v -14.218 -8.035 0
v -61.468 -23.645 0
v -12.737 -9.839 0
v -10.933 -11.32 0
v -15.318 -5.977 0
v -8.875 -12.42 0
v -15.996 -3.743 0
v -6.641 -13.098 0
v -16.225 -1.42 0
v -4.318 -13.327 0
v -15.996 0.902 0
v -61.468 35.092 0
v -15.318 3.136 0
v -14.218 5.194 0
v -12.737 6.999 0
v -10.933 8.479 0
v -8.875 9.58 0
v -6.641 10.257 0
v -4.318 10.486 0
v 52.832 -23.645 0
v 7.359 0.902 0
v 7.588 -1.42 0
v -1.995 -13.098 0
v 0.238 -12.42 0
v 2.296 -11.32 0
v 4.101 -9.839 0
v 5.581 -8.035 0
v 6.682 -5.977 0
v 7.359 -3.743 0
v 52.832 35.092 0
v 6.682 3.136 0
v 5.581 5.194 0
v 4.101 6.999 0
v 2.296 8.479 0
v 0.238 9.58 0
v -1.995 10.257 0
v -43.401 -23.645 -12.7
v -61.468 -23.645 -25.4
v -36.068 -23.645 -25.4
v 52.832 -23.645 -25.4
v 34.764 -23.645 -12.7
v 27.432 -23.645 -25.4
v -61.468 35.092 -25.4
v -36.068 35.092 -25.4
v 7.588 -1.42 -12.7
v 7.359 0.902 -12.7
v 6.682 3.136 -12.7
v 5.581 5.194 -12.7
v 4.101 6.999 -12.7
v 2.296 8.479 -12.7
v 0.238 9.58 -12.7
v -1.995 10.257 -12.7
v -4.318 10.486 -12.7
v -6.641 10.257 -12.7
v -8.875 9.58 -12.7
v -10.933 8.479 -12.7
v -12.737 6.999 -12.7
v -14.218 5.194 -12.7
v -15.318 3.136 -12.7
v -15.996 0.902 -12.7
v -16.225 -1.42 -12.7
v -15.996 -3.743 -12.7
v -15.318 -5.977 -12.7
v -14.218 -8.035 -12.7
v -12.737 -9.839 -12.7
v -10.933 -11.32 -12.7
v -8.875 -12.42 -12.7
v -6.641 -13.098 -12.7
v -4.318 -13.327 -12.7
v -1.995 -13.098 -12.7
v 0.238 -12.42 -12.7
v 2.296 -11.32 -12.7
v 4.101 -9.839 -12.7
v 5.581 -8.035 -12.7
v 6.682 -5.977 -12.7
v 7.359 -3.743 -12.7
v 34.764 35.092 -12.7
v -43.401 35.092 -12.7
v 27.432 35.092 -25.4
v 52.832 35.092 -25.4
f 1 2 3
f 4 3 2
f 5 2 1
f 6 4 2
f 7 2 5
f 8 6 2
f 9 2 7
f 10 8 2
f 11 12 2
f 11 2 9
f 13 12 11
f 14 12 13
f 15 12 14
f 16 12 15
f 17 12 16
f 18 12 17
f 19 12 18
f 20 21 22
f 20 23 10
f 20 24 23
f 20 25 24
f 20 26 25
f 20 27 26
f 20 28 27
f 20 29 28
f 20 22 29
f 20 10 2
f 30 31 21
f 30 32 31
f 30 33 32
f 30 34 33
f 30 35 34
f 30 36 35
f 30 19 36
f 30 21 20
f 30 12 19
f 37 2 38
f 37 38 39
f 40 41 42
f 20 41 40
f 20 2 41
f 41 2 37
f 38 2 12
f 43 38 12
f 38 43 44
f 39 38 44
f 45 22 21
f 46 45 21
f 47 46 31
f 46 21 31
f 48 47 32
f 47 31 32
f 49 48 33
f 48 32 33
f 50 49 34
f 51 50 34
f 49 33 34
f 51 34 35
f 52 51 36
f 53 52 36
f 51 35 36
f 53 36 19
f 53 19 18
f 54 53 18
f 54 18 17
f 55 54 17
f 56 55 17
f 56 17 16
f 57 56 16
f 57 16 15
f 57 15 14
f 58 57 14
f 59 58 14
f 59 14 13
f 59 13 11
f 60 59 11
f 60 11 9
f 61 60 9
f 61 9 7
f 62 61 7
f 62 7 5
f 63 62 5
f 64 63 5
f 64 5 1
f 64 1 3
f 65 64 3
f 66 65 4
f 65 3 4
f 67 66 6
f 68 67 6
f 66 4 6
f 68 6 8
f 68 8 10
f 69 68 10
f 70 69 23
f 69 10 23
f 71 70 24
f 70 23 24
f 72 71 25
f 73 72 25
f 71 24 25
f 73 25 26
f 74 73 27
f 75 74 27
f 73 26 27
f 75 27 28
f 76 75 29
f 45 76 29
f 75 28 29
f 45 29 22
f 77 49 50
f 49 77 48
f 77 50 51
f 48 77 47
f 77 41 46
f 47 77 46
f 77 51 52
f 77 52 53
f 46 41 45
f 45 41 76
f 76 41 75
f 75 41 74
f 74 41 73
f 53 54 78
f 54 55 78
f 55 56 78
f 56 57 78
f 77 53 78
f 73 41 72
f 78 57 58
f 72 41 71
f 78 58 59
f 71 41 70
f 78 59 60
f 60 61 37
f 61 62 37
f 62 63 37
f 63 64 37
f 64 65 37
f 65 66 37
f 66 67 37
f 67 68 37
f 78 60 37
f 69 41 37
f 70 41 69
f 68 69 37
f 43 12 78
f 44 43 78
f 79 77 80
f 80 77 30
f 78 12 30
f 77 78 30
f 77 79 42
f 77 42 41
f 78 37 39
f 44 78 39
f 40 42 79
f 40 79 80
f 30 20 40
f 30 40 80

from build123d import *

# Parameters (mm, degrees)
F0_W     = 114.3
F0_H     = 58.7375
F1_DEPTH = 25.4
F3_DEPTH = 70.358
F4_R     = 11.90625
F5_DEPTH = 24.892


with BuildPart() as f1:
    # F0 (on Top) → F1 (new body)
    with BuildSketch(Plane.XY):
        with Locations((-4.318278, 5.723361)):
            Rectangle(F0_W, F0_H)
    extrude(amount=-F1_DEPTH)

    # F2 (on face) → F3 (cut)
    with BuildSketch(Plane.XZ.offset(23.645389)):
        Polygon((-43.400627, -12.7), (-36.068278, -25.4), (27.431722, -25.4), (34.76407, -12.7), align=None)
    extrude(amount=-F3_DEPTH, mode=Mode.SUBTRACT)

    # F4 (on face) → F5 (cut)
    with BuildSketch(Plane.XY):
        with Locations((-4.318278, -1.420389)):
            Circle(F4_R)
    extrude(amount=-F5_DEPTH, mode=Mode.SUBTRACT)


solid = f1.part
